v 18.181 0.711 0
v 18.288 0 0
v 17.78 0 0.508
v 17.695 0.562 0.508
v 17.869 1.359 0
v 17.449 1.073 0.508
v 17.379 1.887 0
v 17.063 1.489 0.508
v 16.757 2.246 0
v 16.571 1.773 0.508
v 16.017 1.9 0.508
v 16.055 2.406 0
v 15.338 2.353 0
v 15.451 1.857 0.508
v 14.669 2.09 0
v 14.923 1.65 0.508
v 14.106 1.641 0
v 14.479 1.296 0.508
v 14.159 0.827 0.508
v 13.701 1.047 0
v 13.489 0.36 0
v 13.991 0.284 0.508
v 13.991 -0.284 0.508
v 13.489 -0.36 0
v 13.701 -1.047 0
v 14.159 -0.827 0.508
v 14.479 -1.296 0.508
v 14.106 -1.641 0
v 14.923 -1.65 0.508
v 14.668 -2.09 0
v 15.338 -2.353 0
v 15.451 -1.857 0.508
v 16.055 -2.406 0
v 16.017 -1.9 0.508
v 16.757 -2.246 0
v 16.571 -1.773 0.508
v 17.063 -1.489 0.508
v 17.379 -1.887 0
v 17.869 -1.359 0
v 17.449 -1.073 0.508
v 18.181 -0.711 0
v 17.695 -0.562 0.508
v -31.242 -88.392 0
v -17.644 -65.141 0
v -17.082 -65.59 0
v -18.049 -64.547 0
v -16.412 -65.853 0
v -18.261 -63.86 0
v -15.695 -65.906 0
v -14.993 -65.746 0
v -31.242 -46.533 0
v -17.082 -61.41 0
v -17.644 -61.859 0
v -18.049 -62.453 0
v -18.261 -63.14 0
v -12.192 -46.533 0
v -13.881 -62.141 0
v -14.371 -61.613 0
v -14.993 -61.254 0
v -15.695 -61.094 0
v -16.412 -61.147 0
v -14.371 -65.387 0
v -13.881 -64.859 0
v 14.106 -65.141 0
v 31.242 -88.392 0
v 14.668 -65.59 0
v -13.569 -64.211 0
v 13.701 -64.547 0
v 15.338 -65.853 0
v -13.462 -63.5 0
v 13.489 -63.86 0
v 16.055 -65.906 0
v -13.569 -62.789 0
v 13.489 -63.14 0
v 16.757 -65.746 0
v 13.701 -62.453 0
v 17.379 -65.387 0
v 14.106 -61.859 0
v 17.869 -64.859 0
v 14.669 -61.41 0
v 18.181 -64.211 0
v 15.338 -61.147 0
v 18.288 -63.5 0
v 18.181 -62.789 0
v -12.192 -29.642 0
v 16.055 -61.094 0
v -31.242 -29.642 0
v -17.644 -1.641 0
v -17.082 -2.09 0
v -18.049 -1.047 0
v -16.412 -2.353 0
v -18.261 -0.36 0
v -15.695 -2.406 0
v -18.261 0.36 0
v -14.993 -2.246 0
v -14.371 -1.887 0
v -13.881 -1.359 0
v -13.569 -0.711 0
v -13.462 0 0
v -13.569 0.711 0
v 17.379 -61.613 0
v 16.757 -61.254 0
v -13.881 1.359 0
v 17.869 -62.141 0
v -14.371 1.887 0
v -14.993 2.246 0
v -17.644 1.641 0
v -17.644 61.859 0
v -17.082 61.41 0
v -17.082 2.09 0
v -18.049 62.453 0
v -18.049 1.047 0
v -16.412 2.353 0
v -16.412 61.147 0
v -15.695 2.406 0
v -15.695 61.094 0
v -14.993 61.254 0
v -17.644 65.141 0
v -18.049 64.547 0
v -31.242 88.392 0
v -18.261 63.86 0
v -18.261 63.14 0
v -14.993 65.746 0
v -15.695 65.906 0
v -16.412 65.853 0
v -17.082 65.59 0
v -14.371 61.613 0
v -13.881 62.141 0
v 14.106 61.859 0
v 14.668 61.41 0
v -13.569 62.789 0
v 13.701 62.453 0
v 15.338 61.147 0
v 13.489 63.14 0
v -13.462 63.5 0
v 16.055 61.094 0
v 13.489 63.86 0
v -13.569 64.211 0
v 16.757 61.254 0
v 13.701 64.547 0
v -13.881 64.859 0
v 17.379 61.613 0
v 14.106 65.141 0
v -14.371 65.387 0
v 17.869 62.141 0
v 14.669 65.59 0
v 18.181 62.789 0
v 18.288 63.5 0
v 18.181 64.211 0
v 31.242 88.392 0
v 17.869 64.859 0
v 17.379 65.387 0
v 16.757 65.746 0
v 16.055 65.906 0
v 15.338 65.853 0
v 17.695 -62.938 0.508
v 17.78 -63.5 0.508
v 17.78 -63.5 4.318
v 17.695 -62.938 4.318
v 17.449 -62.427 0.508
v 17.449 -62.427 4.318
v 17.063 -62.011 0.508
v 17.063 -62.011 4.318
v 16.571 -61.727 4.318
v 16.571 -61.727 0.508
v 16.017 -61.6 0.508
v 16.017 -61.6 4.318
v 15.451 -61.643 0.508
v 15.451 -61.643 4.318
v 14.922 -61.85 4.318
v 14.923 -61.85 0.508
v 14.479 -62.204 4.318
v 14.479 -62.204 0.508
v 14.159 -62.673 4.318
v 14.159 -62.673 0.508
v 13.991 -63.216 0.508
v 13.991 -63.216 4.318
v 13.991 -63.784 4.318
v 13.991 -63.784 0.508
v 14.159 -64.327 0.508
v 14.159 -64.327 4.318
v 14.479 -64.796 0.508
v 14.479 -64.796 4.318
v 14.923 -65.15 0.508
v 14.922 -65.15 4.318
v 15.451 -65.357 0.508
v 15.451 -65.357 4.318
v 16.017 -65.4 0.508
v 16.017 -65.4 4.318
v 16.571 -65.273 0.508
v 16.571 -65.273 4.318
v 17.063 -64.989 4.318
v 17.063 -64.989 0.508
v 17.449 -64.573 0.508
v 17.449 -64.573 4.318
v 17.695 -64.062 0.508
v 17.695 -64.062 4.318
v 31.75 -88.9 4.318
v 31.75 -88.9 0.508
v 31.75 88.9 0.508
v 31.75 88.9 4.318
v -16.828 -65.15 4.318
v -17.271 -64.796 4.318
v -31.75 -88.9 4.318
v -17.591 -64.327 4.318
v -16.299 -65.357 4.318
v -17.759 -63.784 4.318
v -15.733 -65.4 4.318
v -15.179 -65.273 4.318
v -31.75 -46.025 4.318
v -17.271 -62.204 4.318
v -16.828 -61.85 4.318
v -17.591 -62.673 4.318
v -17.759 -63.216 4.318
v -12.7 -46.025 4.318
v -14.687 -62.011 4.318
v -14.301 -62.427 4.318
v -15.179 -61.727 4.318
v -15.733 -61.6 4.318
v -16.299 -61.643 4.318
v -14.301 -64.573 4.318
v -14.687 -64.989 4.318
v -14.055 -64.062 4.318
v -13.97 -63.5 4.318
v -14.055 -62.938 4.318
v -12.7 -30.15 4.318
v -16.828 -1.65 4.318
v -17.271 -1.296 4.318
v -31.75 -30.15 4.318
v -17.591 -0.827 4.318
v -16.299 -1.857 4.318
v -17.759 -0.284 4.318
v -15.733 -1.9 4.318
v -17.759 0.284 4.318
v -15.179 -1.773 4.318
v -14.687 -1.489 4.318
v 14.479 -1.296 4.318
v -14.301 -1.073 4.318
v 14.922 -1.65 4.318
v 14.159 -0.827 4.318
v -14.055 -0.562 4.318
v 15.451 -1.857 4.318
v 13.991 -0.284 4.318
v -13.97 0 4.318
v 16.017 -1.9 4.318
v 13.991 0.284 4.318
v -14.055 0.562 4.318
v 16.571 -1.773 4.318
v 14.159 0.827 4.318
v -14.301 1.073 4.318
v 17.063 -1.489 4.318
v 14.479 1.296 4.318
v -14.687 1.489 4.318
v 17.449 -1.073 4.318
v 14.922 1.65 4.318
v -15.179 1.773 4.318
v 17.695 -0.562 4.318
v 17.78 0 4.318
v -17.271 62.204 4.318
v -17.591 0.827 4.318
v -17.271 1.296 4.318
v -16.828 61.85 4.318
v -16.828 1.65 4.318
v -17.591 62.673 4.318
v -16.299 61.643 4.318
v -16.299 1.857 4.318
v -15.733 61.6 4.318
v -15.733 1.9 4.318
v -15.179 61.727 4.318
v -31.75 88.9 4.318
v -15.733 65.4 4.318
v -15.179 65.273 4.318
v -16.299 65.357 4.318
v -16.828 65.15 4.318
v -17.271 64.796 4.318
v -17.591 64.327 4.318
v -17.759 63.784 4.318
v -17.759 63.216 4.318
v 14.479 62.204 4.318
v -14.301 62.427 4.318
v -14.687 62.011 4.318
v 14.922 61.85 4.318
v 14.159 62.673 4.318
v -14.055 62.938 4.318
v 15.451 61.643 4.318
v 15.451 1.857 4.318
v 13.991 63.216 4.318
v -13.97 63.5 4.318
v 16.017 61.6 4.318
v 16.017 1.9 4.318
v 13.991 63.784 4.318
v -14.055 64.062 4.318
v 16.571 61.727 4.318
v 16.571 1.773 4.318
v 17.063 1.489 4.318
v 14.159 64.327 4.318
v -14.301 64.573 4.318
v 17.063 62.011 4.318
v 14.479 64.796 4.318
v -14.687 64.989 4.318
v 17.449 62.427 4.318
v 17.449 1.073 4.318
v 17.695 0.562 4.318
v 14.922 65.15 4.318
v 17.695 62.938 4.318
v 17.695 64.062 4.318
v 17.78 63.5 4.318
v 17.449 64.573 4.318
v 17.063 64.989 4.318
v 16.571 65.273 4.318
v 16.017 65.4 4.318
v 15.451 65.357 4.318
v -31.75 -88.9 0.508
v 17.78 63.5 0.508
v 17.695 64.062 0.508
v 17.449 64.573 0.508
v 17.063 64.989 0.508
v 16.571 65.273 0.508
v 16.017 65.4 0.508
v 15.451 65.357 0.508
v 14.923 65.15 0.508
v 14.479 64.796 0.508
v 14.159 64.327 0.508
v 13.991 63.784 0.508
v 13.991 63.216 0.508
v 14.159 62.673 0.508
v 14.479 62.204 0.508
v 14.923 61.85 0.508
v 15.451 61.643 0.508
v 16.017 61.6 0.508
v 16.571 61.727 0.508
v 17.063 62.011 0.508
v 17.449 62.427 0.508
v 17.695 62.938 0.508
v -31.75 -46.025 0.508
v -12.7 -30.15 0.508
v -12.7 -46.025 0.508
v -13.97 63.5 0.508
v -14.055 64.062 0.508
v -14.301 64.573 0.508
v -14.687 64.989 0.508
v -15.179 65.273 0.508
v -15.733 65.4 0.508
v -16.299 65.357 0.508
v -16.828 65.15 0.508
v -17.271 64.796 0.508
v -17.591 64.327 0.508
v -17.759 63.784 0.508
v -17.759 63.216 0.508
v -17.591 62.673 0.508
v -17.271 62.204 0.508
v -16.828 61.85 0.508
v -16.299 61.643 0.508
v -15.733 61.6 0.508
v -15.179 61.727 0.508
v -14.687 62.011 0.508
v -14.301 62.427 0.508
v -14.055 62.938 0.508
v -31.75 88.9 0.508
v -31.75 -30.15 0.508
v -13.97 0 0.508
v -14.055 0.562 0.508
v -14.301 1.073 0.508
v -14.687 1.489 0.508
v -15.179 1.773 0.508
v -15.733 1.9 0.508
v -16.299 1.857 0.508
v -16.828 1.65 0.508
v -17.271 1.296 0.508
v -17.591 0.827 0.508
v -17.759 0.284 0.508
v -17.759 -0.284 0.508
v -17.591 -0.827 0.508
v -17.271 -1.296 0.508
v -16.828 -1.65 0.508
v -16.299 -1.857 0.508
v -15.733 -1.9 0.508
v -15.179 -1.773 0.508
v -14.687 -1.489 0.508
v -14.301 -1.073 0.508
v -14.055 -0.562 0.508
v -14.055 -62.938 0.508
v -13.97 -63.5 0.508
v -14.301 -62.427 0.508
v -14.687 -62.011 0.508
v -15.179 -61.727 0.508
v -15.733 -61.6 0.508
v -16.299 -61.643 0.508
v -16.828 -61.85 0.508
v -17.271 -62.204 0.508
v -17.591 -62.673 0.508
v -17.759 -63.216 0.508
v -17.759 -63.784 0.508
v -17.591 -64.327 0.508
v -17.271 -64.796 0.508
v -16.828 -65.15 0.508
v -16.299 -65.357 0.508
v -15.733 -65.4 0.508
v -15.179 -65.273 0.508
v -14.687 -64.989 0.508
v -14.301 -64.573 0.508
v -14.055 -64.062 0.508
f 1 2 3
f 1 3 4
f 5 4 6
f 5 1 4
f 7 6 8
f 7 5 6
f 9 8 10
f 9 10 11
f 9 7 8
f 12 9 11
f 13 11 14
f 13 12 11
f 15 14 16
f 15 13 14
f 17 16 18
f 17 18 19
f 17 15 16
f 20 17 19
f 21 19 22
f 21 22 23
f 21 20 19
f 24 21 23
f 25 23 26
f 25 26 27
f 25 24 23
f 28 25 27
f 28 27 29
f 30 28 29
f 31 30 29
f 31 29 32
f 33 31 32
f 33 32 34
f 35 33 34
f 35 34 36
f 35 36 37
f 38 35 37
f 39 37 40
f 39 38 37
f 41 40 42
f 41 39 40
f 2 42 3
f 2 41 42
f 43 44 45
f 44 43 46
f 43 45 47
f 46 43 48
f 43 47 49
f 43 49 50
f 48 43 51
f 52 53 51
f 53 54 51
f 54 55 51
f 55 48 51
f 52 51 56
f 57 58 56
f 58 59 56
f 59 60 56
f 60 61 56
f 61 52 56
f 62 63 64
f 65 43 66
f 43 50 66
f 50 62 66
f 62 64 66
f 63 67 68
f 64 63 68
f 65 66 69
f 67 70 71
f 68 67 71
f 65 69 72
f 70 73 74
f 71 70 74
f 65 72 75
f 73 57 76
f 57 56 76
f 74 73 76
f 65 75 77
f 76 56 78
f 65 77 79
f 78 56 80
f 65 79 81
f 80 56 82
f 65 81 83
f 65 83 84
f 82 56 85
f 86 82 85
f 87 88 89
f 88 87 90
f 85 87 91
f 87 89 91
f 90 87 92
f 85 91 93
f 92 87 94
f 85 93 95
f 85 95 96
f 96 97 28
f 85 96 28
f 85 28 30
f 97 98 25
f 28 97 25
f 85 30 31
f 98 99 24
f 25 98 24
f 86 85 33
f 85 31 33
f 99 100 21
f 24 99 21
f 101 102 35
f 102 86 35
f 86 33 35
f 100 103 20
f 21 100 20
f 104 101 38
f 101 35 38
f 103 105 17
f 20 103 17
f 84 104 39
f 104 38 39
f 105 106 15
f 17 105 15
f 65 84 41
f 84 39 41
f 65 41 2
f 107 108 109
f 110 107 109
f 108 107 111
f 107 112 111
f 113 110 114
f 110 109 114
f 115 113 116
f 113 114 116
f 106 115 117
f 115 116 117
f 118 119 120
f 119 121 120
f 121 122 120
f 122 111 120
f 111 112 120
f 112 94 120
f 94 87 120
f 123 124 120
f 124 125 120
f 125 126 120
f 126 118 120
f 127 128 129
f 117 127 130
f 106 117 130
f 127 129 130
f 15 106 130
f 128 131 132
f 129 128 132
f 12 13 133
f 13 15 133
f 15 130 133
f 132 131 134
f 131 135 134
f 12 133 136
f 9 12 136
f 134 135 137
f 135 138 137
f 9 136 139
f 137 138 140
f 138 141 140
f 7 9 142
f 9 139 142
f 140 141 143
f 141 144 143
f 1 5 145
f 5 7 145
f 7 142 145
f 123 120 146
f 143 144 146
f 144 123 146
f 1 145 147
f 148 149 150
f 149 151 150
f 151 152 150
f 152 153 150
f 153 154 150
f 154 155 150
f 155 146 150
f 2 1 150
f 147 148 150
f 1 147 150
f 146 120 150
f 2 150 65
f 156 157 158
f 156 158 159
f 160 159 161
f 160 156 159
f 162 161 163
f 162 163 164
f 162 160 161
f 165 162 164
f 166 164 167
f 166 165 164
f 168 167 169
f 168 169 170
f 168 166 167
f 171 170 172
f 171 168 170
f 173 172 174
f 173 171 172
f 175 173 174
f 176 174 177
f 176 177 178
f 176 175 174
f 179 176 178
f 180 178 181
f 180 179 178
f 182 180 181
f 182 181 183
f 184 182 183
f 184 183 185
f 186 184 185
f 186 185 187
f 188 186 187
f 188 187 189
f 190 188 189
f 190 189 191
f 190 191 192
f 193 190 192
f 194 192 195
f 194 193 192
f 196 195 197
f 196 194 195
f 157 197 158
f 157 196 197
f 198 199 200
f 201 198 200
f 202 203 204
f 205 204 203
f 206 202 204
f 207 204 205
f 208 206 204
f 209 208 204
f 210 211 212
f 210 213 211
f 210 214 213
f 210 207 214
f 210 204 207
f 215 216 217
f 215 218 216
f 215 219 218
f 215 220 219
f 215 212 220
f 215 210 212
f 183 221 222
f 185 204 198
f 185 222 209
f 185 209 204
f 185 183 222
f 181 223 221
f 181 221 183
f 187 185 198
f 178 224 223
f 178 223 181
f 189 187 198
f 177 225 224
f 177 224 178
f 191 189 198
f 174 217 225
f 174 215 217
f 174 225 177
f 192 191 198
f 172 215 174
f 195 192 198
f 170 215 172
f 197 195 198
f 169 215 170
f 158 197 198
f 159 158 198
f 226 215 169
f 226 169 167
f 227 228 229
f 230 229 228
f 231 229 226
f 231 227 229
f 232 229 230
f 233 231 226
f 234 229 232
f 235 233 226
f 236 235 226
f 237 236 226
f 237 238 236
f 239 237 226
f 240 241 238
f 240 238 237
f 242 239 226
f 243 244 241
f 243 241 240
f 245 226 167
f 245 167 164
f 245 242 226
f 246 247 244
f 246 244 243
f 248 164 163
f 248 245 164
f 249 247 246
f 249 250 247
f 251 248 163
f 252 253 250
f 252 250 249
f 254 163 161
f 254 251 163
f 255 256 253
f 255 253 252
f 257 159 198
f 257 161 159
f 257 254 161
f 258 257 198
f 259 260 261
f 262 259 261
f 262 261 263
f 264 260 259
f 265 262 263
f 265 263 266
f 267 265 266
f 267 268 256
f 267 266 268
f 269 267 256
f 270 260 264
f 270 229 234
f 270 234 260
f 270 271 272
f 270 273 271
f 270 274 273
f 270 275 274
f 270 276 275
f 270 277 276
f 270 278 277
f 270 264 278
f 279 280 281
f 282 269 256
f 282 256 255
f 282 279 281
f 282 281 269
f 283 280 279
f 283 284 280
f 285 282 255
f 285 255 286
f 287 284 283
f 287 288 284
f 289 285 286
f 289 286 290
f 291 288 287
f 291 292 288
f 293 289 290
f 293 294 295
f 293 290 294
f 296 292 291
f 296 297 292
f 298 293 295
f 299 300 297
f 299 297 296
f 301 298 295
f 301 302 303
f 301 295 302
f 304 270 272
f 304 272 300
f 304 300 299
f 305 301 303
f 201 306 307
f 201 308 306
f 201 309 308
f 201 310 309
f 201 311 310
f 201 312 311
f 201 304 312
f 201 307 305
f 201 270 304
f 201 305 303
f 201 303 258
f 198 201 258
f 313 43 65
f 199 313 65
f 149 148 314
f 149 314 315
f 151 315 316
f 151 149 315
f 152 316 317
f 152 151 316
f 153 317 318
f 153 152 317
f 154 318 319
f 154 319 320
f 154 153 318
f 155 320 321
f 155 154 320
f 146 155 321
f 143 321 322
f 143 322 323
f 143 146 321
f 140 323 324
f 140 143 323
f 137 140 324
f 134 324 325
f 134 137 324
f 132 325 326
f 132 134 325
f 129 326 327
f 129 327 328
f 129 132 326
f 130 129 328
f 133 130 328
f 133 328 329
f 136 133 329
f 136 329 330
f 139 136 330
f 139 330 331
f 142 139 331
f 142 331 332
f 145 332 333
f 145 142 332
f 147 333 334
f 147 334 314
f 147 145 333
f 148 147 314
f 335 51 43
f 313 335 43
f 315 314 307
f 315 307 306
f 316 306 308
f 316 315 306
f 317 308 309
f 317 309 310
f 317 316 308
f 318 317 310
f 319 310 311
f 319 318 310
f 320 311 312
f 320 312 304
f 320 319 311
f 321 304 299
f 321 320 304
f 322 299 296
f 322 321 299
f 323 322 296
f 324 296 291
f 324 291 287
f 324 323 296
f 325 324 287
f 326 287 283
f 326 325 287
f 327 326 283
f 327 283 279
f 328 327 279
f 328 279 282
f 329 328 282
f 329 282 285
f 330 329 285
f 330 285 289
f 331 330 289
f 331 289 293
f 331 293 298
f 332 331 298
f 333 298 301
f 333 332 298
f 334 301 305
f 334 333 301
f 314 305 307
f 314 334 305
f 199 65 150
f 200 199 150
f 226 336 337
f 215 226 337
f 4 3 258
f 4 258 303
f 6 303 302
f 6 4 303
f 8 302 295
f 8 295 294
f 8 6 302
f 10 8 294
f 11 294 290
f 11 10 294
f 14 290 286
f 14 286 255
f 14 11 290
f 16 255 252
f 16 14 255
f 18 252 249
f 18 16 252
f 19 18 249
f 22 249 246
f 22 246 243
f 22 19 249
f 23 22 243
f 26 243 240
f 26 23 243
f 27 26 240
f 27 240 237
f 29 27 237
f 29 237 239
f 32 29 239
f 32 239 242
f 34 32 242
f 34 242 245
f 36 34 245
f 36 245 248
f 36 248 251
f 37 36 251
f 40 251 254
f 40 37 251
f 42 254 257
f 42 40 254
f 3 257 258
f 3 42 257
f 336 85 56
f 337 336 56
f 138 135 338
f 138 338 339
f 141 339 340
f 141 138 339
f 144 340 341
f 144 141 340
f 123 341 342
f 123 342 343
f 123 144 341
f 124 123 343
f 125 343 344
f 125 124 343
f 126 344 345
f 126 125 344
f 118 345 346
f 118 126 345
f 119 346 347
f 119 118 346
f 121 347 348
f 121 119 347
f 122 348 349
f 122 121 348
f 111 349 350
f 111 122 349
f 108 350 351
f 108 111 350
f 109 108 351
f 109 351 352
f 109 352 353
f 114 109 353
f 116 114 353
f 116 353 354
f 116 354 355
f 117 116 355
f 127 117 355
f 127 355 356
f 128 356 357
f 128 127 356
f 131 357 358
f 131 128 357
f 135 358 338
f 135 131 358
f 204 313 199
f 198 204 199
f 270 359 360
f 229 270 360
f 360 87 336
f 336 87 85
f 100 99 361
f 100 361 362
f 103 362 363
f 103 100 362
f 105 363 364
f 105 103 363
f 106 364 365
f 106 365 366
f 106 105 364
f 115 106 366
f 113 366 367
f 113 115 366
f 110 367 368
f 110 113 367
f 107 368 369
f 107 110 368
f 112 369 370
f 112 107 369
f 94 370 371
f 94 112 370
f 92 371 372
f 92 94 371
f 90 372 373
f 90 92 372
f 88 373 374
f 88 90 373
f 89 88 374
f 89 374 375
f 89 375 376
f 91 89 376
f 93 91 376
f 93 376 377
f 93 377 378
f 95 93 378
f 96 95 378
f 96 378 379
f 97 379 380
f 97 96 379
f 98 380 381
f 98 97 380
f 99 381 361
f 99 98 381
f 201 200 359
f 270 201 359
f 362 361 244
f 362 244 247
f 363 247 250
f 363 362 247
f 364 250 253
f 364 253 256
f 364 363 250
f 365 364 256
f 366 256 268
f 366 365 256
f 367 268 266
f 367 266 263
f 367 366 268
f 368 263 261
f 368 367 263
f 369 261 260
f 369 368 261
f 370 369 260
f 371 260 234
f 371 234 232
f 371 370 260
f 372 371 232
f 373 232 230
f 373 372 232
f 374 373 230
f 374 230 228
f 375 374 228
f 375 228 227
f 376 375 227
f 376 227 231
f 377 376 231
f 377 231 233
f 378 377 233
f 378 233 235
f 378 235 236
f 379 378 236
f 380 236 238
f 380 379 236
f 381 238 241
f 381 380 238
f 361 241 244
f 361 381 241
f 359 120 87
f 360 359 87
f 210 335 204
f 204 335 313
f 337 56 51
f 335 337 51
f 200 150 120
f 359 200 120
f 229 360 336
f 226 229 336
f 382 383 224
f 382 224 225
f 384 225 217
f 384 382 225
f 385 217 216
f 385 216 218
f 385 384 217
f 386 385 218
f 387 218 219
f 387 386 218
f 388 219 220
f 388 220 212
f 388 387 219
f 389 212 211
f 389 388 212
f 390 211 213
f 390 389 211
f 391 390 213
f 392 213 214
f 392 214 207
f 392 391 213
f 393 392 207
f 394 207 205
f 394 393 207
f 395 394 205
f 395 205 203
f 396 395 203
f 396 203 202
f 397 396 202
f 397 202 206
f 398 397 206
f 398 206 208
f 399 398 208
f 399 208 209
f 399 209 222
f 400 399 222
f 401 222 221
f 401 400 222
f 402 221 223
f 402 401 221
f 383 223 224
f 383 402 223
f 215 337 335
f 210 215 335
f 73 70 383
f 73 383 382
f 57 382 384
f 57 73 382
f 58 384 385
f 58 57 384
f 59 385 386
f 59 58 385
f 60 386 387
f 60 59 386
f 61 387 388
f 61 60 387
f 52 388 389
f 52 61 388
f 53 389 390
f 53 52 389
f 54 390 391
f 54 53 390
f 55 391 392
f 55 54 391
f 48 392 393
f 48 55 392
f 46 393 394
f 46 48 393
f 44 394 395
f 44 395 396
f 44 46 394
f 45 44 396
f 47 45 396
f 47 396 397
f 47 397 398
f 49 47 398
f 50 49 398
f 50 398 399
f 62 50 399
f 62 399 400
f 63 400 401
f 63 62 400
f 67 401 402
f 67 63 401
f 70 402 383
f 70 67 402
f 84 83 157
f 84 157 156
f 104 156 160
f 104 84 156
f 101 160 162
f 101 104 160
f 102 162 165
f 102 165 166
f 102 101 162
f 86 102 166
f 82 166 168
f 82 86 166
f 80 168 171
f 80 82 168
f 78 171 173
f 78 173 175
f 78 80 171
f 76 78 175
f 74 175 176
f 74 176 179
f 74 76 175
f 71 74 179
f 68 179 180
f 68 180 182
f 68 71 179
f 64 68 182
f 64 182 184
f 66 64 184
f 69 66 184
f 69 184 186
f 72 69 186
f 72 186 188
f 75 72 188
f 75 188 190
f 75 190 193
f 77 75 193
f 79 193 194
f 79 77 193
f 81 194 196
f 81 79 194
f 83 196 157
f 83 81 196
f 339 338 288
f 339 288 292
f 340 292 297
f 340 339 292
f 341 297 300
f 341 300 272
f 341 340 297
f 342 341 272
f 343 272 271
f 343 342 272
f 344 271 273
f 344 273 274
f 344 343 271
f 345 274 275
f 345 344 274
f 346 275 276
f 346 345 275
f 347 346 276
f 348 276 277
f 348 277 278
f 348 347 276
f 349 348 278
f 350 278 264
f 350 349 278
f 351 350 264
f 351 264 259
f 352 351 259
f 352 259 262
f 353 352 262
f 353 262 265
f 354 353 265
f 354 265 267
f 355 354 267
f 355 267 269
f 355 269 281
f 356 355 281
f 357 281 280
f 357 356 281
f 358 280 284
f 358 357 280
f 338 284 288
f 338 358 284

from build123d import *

# Parameters (mm, degrees)
F0_R     = 1.905
F1_DEPTH = 4.318
F2_SIZE  = 0.508


with BuildPart() as f1:
    # F0 (on Top) → F1 (new body)
    with BuildSketch(Plane.XY):
        Polygon((-31.75, -88.9), (31.75, -88.9), (31.75, 88.9), (-31.75, 88.9), (-31.75, -30.1498), (-12.7, -30.1498), (-12.7, -46.0248), (-31.75, -46.0248), align=None)
        with Locations((-15.875, -63.5)):
            Circle(F0_R, mode=Mode.SUBTRACT)
        with Locations((15.875, -63.5)):
            Circle(F0_R, mode=Mode.SUBTRACT)
        with Locations((-15.875, 0)):
            Circle(F0_R, mode=Mode.SUBTRACT)
        with Locations((-15.875, 63.5)):
            Circle(F0_R, mode=Mode.SUBTRACT)
        with Locations((15.875, 0)):
            Circle(F0_R, mode=Mode.SUBTRACT)
        with Locations((15.875, 63.5)):
            Circle(F0_R, mode=Mode.SUBTRACT)
    extrude(amount=F1_DEPTH)

    # F2
    f2_edges = [f1.edges().sort_by_distance(p)[0] for p in [
        (0, -88.9, 0),
        (-31.75, -67.4624, 0),
        (-22.225, -46.0248, 0),
        (-12.7, -38.0873, 0),
        (-22.225, -30.1498, 0),
        (-31.75, 29.3751, 0),
        (0, 88.9, 0),
        (31.75, 0, 0),
        (-17.78, 0, 0),
        (13.97, 0, 0),
        (13.97, -63.5, 0),
        (-17.78, -63.5, 0),
        (-17.78, 63.5, 0),
        (13.97, 63.5, 0),
    ]]
    chamfer(f2_edges, length=F2_SIZE)


solid = f1.part
